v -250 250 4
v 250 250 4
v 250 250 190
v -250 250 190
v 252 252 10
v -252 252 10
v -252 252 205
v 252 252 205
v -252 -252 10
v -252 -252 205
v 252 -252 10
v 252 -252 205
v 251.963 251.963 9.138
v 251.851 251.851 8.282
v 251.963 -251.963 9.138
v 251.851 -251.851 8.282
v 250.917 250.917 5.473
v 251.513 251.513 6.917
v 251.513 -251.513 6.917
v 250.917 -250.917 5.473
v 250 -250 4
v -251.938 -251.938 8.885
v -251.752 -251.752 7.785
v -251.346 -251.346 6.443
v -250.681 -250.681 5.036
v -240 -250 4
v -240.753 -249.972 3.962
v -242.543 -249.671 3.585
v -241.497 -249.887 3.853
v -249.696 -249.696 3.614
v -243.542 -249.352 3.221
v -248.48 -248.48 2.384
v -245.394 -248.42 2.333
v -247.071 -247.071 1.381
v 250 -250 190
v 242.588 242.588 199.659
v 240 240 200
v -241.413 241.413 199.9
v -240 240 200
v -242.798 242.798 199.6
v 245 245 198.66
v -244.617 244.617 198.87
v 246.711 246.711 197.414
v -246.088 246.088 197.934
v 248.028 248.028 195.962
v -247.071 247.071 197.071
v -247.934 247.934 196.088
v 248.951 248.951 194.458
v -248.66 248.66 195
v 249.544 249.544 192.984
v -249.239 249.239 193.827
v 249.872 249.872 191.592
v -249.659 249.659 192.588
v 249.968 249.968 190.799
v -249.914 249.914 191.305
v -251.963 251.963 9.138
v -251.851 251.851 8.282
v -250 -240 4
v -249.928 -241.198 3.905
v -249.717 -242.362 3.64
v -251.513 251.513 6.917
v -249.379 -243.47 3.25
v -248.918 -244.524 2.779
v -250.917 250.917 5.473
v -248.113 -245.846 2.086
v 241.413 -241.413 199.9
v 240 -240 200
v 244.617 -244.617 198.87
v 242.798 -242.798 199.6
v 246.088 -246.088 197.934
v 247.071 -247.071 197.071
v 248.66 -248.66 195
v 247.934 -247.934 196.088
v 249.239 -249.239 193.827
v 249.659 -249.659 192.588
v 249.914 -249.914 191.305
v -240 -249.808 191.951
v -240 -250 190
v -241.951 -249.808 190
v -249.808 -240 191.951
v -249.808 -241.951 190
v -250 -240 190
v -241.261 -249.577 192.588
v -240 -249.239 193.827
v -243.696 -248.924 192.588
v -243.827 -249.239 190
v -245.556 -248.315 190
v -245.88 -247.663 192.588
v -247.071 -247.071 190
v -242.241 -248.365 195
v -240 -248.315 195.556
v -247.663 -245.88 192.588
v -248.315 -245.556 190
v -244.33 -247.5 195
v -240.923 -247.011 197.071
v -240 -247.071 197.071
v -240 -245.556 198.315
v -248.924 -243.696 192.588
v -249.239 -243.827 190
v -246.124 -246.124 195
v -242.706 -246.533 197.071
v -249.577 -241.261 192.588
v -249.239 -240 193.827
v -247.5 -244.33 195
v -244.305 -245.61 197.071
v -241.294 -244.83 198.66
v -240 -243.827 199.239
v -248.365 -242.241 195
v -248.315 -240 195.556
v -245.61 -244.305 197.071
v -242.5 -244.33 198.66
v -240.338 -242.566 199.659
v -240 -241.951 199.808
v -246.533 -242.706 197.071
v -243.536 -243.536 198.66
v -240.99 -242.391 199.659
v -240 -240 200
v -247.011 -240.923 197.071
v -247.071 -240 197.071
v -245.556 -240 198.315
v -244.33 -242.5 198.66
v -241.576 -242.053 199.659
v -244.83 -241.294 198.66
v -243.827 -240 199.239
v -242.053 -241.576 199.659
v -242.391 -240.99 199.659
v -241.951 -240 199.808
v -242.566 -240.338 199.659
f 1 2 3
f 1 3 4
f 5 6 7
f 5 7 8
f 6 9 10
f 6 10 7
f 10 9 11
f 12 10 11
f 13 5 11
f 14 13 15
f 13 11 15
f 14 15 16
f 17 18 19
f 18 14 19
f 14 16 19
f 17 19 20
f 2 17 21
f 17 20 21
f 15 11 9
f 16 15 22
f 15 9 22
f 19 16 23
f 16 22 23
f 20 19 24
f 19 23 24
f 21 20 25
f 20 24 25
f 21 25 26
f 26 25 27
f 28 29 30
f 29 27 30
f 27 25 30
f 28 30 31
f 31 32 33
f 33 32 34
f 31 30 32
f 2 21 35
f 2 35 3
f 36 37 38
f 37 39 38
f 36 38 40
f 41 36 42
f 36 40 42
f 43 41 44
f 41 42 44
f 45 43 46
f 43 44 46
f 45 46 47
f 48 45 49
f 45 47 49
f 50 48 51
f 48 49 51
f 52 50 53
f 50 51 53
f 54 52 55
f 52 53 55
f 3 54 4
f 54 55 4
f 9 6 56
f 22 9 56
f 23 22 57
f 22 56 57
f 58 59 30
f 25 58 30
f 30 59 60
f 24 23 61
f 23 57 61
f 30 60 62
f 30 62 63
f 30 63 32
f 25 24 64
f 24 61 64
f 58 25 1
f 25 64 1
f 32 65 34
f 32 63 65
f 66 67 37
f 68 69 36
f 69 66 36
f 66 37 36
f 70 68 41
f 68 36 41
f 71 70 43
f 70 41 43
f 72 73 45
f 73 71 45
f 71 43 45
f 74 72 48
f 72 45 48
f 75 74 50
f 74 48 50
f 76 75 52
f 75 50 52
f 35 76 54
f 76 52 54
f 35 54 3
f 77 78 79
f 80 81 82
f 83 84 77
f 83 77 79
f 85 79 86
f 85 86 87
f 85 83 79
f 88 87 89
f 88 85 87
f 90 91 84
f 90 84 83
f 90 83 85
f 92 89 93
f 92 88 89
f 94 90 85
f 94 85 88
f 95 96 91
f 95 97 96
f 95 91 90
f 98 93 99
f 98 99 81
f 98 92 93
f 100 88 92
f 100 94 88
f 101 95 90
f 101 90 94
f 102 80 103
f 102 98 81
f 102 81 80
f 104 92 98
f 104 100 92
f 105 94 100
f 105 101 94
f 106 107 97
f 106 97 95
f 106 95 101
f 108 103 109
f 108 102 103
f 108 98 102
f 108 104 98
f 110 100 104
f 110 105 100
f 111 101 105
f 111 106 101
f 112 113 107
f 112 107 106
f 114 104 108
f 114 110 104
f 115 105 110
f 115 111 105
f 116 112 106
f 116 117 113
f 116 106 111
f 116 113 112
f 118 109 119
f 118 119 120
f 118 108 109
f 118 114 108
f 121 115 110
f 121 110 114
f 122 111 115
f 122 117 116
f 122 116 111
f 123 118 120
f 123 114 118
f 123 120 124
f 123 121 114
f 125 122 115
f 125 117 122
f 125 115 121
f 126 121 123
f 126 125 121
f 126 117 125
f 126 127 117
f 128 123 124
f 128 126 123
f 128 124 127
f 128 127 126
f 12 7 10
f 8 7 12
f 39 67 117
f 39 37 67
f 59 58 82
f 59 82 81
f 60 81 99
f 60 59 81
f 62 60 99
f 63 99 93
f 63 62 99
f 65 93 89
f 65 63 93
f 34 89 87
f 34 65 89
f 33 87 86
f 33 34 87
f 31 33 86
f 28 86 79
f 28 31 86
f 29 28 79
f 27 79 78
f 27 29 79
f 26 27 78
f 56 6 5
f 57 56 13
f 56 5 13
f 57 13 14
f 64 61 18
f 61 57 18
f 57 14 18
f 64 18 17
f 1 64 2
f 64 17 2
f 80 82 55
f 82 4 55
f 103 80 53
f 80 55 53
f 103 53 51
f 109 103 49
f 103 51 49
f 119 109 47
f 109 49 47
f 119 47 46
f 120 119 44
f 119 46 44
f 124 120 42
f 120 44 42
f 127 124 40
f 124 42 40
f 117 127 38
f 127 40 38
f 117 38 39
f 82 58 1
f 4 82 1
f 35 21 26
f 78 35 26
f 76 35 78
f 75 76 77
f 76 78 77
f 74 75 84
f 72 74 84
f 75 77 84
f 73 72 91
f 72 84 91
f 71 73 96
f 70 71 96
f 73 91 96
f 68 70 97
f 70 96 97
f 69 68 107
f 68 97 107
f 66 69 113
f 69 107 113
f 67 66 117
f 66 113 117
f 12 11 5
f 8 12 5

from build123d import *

# Parameters (mm, degrees)
SKETCH1_W           = 504
SKETCH1_H           = 504
BOSS_EXTRUDE1_DEPTH = 205
SKETCH2_W           = 500
SKETCH2_H           = 500
CUT_EXTRUDE1_DEPTH  = 200
FILLET2_R           = 10
FILLET4_R           = 10


with BuildPart() as part:
    # Sketch1 → Boss-Extrude1 (new body)
    with BuildSketch(Plane.XY):
        Rectangle(SKETCH1_W, SKETCH1_H)
    extrude(amount=BOSS_EXTRUDE1_DEPTH)

    # Sketch2 → Cut-Extrude1 (cut)
    with BuildSketch(Plane(origin=(0, 0, 0), x_dir=(-1, 0, 0), z_dir=(0, 0, -1))):
        Rectangle(SKETCH2_W, SKETCH2_H)
    extrude(amount=-CUT_EXTRUDE1_DEPTH, mode=Mode.SUBTRACT)

    # Fillet2
    # the kernel refuses this fillet: 10 mm, written as the material it adds along each edge
    with BuildSketch(Plane(origin=(-250, -250, 0), x_dir=(0, 1, 0), z_dir=(0, 0, 1))) as fillet2_piece_1:
        with BuildLine():
            CenterArc((FILLET2_R, -FILLET2_R), FILLET2_R, 90, 90)
            Line((0, -FILLET2_R), (0, 0))
            Line((0, 0), (FILLET2_R, 0))
        make_face()
    extrude(amount=200)
    # the kernel refuses this fillet: 10 mm, written as the material it takes off along each edge
    with BuildSketch(Plane(origin=(-277, -252, 0), x_dir=(0, 1, 0), z_dir=(1, 0, 0))) as fillet2_2_piece_1:
        with BuildLine():
            CenterArc((FILLET2_R, FILLET2_R), FILLET2_R, 180, 90)
            Line((0, FILLET2_R), (0, 0))
            Line((0, 0), (FILLET2_R, 0))
        make_face()
    extrude(amount=554, mode=Mode.SUBTRACT)
    with BuildSketch(Plane(origin=(252, -277, 0), x_dir=(0, 0, 1), z_dir=(0, 1, 0)), Plane(origin=(277, 252, 0), x_dir=(0, 0, 1), z_dir=(-1, 0, 0)), Plane(origin=(-252, 277, 0), x_dir=(0, 0, 1), z_dir=(0, -1, 0))) as fillet2_2_piece_2:
        with BuildLine():
            CenterArc((FILLET2_R, -FILLET2_R), FILLET2_R, 90, 90)
            Line((0, -FILLET2_R), (0, 0))
            Line((0, 0), (FILLET2_R, 0))
        make_face()
    extrude(amount=554, mode=Mode.SUBTRACT)

    # Fillet4
    fillet4_edges = [part.edges().sort_by_distance(p)[0] for p in [
        (5, -250, 200),
        (250, 0, 200),
        (0, 250, 200),
        (-250, 5, 200),
        (-247.071067812, -247.071067812, 200),
    ]]
    fillet(fillet4_edges, radius=FILLET4_R)


solid = part.part
